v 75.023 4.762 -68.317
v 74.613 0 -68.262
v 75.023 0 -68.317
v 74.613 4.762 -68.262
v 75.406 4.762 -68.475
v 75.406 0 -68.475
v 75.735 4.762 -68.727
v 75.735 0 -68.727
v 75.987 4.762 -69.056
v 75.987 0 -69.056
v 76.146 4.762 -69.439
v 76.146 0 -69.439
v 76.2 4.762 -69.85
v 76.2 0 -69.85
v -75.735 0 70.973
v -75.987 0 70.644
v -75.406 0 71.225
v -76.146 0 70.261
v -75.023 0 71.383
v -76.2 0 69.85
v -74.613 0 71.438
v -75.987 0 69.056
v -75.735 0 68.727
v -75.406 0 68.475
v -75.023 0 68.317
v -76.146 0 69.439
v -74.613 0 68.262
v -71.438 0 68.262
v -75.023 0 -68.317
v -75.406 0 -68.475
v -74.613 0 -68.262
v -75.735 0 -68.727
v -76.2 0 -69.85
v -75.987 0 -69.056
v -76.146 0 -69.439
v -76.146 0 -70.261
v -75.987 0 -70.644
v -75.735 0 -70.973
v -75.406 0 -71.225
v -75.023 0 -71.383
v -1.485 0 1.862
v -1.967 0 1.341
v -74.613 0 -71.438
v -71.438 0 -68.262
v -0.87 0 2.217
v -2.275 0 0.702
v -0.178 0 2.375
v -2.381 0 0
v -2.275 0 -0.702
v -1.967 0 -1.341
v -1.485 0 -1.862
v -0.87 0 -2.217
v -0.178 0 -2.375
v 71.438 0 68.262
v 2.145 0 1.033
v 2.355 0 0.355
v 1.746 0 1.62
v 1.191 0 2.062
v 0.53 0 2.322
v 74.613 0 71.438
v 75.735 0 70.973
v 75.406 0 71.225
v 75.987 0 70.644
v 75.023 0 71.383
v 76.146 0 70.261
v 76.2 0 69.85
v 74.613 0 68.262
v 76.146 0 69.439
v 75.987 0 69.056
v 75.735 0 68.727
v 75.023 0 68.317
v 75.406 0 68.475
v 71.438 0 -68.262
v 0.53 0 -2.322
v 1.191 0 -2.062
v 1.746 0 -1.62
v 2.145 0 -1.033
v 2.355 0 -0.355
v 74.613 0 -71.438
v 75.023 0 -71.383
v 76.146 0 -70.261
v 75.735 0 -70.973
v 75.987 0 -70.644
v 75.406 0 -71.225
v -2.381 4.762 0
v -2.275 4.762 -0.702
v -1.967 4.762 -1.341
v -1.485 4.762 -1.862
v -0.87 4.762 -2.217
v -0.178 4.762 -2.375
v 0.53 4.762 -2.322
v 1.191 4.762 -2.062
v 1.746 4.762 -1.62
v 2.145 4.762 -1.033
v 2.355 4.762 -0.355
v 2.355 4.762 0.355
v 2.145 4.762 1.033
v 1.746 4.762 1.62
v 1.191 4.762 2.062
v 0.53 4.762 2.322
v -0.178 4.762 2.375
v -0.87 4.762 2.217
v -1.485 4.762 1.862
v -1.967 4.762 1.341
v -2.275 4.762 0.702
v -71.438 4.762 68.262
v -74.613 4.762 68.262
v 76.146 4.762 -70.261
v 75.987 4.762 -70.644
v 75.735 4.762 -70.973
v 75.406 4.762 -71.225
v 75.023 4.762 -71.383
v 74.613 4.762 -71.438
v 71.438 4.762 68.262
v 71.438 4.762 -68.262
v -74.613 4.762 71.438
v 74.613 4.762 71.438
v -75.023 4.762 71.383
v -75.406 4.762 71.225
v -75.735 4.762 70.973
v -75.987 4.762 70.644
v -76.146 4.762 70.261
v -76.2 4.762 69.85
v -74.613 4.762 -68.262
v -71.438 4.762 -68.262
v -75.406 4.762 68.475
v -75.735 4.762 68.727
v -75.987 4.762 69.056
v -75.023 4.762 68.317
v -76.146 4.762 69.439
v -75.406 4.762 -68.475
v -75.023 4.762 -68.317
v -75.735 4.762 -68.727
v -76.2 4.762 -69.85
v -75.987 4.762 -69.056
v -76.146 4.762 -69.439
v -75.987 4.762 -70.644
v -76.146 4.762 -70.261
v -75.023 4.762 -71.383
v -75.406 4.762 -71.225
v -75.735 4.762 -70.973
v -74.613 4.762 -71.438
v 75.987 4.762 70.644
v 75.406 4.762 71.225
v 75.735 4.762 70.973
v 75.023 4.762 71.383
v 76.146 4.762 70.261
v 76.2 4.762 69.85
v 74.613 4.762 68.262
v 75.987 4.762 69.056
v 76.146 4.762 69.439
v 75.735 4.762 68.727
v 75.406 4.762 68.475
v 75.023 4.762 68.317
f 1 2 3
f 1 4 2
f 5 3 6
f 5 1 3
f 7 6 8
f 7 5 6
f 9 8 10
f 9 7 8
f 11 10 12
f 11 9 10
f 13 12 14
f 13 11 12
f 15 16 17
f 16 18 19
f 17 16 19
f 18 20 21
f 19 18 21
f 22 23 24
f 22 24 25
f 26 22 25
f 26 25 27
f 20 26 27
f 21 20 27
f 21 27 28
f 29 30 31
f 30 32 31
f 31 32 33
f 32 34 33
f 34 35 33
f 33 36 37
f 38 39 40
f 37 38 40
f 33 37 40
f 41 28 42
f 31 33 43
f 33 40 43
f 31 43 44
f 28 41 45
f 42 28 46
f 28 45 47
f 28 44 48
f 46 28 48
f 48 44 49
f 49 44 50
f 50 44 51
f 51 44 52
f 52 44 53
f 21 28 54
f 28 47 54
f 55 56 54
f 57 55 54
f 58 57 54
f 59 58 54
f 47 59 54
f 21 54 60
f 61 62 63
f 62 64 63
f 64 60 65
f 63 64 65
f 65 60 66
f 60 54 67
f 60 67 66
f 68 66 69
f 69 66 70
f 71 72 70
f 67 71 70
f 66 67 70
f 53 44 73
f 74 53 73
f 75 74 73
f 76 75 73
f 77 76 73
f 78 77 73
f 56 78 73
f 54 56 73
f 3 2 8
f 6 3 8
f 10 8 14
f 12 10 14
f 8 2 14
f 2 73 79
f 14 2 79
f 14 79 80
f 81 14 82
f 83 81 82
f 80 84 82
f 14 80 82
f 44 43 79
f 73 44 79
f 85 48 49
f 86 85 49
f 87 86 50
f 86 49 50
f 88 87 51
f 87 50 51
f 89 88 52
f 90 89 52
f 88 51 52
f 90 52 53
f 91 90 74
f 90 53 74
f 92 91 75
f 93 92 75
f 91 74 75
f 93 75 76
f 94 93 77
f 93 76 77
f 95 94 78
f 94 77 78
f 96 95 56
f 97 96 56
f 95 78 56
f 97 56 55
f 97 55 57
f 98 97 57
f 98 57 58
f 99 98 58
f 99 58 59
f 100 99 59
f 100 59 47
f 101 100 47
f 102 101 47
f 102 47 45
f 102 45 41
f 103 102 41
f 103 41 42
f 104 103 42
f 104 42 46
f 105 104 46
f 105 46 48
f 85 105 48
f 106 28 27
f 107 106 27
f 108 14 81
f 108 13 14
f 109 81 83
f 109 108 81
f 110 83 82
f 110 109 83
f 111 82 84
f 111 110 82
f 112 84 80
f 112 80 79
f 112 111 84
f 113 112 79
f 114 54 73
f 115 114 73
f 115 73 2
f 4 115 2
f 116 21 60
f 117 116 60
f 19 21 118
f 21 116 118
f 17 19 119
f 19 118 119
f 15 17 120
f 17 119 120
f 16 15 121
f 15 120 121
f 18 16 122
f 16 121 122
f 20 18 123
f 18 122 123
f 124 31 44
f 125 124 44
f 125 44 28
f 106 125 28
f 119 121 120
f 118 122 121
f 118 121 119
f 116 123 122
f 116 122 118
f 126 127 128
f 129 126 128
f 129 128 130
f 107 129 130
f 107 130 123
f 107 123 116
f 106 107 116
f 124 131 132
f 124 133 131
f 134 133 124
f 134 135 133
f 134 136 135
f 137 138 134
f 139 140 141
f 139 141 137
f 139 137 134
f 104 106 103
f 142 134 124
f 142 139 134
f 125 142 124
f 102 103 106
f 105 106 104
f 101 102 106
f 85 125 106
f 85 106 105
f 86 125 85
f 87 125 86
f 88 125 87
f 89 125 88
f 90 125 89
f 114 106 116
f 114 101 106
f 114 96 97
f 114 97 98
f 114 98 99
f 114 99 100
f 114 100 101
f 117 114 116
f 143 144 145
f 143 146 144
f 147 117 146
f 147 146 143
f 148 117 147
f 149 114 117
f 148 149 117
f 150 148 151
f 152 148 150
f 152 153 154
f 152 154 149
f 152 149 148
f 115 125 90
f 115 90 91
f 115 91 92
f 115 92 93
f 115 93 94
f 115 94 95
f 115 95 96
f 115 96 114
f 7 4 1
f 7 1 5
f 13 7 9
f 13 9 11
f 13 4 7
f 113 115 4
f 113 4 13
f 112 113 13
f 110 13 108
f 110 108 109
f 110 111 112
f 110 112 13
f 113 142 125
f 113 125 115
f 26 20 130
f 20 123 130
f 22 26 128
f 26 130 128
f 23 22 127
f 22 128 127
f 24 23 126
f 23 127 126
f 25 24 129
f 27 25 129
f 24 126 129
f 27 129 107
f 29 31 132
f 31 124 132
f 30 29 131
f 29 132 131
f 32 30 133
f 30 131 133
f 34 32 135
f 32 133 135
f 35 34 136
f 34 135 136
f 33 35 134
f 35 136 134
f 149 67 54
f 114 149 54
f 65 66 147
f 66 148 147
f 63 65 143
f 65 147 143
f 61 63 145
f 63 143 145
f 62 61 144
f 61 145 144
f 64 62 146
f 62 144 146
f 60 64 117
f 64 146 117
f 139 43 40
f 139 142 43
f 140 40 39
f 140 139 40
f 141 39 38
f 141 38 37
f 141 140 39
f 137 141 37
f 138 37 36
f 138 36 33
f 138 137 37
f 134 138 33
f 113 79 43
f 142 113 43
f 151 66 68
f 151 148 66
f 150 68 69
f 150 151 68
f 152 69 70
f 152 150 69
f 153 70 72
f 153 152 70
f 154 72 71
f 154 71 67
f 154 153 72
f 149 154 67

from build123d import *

# Parameters (mm, degrees)
BOSS_EXTRUDE1_DEPTH            = 4.7625
F_3_16_0_1875_DIAMETER_HOLE1_D = 4.7625
FILLET1_R                      = 1.5875


with BuildPart() as part:
    # Sketch1 → Boss-Extrude1 (new body)
    with BuildSketch(Plane(origin=(0, 0, 0), x_dir=(1, 0, 0), z_dir=(0, 1, 0))):
        Polygon((-71.4375, -71.4375), (71.4375, -71.4375), (76.2, -71.4375), (76.2, -68.2625), (71.4375, -68.2625), (71.4375, 68.2625), (76.2, 68.2625), (76.2, 71.4375), (71.4375, 71.4375), (-71.4375, 71.4375), (-76.2, 71.4375), (-76.2, 68.2625), (-71.4375, 68.2625), (-71.4375, -68.2625), (-76.2, -68.2625), (-76.2, -71.4375), align=None)
    extrude(amount=BOSS_EXTRUDE1_DEPTH)

    # 3/16 (0.1875) Diameter Hole1 (through all)
    with Locations(Plane(origin=(0, 4.7625, 0), x_dir=(1, 0, 0), z_dir=(0, 1, 0))):
        with Locations((0, 0)):
            Hole(F_3_16_0_1875_DIAMETER_HOLE1_D / 2)

    # Fillet1
    fillet1_edges = [part.edges().sort_by_distance(p)[0] for p in [
        (-76.2, 2.38125, 71.4375),
        (-76.2, 2.38125, 68.2625),
        (76.2, 2.38125, 71.4375),
        (76.2, 2.38125, 68.2625),
        (76.2, 2.38125, -68.2625),
        (76.2, 2.38125, -71.4375),
        (-76.2, 2.38125, -68.2625),
        (-76.2, 2.38125, -71.4375),
    ]]
    fillet(fillet1_edges, radius=FILLET1_R - 0.0001)  # a hair under: the kernel refuses the full size


solid = part.part
